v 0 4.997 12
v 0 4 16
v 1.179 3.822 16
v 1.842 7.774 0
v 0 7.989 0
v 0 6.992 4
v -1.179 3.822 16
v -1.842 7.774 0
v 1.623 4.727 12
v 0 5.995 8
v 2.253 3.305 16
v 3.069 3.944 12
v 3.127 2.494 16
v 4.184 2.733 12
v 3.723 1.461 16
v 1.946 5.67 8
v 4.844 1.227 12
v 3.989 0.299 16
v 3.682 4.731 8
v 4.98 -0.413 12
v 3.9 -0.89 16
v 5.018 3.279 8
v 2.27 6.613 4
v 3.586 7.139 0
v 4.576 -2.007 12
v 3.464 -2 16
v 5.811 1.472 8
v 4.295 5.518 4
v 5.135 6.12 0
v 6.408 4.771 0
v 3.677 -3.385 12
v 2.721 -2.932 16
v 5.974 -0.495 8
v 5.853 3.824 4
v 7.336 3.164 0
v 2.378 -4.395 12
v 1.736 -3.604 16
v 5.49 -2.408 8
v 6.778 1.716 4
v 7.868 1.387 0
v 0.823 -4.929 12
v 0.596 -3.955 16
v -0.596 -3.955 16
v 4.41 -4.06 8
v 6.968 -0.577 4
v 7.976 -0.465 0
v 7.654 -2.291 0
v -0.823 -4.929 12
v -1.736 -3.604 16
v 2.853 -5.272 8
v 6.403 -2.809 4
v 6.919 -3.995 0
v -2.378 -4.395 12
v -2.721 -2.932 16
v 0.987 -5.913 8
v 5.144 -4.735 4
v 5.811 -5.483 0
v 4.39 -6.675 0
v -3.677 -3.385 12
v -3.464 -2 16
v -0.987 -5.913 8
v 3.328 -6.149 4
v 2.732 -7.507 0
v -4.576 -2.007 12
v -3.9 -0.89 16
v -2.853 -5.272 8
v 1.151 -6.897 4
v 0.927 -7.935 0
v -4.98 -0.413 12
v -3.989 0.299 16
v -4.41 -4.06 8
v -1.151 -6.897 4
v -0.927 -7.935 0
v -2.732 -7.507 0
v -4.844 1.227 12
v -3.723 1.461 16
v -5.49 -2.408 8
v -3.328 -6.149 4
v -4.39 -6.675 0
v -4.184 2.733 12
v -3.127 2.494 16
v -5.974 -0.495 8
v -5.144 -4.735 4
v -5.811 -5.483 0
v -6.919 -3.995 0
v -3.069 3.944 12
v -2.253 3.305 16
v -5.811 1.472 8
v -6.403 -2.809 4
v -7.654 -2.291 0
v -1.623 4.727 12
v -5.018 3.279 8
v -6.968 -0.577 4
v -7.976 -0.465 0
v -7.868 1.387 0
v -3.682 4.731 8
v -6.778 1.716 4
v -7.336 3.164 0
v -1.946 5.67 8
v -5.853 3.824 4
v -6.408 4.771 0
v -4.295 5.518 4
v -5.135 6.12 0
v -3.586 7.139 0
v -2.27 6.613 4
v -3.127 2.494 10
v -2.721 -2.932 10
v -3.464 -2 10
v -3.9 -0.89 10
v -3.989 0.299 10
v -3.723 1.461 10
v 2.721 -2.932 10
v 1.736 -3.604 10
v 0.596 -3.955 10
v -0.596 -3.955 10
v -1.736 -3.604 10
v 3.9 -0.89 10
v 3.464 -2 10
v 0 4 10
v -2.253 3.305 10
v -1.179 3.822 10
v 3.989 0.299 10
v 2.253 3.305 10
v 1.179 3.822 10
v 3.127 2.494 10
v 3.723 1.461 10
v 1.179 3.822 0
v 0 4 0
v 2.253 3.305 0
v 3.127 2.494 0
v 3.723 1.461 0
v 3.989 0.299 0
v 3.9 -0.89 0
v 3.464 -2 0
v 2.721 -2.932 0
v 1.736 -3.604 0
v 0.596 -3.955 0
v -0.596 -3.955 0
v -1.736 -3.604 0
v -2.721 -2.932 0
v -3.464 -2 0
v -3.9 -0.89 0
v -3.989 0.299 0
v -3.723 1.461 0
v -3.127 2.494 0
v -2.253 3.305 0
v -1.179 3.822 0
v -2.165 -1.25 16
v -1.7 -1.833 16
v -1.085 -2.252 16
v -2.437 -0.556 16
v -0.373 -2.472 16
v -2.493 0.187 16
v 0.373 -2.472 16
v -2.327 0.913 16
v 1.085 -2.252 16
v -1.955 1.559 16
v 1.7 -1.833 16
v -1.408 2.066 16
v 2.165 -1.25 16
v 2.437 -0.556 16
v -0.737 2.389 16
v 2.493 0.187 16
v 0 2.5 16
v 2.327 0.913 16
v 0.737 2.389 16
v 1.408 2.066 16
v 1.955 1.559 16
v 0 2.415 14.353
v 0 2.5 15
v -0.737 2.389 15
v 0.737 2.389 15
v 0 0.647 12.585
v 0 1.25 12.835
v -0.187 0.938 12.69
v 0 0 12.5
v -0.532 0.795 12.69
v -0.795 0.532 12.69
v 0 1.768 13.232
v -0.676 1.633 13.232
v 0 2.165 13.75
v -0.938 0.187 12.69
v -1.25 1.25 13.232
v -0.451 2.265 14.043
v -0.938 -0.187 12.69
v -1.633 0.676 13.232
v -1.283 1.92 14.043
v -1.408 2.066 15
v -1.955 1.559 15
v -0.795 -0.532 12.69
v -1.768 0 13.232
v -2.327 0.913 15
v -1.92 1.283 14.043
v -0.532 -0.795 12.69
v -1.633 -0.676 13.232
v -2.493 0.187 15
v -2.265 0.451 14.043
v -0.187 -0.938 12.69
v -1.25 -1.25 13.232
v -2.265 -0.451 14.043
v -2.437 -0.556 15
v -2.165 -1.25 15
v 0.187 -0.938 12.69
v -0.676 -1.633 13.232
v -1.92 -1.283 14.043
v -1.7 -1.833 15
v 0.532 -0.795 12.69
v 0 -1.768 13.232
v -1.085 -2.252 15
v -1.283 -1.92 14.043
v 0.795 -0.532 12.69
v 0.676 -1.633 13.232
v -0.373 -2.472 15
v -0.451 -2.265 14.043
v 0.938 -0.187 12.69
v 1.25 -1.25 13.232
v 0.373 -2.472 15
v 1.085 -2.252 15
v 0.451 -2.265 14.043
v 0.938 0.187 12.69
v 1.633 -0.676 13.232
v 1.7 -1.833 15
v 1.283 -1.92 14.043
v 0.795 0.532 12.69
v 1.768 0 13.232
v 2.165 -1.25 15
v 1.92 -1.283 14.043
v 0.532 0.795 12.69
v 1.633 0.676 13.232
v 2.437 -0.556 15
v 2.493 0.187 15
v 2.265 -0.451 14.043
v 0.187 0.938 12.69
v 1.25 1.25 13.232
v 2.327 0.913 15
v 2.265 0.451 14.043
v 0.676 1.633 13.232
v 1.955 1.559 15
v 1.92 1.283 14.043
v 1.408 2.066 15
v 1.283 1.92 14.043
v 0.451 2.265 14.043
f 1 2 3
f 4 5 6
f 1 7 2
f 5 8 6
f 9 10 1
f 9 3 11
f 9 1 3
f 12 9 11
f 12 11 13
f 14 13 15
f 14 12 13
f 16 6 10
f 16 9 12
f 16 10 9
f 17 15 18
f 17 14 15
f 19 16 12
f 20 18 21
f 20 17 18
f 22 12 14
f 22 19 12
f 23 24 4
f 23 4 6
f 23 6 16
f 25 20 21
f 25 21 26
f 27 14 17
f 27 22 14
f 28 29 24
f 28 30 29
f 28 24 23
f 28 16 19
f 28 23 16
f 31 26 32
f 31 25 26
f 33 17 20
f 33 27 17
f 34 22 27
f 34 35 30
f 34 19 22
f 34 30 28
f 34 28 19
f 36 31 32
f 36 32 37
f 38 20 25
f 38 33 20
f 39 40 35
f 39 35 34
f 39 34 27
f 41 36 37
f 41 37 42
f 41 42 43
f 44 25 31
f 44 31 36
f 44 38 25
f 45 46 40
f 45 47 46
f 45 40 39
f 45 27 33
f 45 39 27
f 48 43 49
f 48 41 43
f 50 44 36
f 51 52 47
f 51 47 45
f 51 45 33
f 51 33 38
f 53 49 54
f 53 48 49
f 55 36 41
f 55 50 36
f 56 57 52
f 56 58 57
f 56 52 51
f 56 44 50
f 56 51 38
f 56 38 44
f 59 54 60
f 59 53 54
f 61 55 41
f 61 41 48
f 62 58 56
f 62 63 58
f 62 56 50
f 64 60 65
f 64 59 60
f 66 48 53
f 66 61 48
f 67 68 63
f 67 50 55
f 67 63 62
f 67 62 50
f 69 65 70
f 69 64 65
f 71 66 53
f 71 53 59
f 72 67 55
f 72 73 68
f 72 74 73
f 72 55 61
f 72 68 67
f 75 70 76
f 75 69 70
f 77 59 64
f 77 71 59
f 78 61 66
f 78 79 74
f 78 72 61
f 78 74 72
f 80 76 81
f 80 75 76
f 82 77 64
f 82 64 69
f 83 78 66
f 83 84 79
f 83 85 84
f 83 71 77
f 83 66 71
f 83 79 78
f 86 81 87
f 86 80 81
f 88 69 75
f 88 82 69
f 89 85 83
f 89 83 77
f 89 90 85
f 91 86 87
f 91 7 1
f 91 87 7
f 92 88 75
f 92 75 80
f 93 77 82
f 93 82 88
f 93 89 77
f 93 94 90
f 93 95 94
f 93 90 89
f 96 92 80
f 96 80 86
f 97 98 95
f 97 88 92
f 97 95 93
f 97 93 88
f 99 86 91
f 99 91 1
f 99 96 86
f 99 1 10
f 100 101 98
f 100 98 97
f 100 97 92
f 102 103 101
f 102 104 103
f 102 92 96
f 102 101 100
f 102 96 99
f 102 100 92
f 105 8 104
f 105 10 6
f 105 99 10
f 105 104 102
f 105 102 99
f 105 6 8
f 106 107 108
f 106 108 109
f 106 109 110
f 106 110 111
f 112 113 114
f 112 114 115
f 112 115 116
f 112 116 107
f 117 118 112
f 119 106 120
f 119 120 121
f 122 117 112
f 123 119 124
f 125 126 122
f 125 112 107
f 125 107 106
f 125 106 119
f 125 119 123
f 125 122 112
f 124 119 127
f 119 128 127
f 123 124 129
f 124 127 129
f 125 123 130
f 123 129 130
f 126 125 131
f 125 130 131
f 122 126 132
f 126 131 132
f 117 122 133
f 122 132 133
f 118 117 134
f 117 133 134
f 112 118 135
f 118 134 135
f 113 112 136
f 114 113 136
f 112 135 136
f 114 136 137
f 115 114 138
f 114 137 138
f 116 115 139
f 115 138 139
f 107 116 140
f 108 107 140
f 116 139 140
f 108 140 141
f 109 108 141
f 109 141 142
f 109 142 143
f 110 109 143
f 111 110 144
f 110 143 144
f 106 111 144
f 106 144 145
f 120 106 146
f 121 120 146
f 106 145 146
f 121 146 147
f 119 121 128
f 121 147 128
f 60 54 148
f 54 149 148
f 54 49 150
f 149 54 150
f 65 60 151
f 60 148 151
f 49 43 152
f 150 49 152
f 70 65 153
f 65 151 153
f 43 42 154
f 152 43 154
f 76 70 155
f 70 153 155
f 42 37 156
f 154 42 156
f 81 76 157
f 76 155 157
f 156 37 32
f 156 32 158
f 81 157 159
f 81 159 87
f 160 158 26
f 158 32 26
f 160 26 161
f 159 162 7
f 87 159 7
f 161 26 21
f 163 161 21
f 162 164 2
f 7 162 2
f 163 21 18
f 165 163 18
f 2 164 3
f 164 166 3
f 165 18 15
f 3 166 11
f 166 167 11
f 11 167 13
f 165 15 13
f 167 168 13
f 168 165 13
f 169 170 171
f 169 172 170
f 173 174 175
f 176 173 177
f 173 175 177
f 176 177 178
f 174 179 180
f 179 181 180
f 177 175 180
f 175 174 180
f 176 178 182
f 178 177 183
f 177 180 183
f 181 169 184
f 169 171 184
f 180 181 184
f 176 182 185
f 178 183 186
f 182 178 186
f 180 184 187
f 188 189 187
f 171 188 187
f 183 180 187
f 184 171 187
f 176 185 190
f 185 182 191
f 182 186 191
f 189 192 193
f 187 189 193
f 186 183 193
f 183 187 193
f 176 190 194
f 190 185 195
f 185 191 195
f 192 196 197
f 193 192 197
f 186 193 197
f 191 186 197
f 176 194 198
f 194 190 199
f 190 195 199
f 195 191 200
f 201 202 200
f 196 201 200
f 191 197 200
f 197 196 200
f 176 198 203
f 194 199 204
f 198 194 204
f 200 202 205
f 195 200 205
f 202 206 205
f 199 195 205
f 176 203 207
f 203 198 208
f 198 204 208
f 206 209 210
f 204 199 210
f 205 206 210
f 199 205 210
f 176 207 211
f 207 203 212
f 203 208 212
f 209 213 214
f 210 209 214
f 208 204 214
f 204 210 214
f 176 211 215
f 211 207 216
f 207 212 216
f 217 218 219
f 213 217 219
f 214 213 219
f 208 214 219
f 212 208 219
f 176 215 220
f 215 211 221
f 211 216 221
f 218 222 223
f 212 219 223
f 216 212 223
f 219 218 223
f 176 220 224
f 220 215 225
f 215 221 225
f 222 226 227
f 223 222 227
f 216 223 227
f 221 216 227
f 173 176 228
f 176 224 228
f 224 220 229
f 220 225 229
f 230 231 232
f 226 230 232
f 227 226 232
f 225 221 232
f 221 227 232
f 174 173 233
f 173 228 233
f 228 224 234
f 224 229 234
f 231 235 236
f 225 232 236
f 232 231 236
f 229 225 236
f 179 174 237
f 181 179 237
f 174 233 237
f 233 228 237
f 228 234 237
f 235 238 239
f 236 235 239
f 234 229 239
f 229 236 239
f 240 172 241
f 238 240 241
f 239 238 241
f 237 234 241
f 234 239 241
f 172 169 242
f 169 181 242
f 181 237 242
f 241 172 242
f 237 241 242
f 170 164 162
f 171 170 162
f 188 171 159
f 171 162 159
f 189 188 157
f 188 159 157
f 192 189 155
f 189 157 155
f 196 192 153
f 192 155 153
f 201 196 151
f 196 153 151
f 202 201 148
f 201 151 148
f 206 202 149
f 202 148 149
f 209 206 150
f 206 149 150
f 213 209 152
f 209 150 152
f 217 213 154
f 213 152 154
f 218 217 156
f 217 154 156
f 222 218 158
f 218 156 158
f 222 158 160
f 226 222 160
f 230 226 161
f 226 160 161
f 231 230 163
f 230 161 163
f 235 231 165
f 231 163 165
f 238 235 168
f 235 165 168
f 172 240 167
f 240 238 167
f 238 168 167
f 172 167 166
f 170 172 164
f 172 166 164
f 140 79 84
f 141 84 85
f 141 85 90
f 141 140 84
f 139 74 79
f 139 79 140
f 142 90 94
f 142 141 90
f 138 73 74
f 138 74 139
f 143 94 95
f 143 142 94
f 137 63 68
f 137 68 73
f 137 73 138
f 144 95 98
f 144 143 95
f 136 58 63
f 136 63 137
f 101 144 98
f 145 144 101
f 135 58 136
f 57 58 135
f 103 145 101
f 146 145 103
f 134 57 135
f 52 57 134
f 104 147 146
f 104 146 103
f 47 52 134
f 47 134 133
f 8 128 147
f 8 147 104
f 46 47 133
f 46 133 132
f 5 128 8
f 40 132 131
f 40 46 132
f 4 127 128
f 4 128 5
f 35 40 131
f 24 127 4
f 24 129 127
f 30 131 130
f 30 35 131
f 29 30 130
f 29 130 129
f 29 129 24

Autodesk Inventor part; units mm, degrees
ref_plane "YZ Plane" through (0, 0, 0) normal (1, 0, 0) x (0, 1, 0)
ref_plane "XZ Plane" through (0, 0, 0) normal (0, 1, 0) x (-1, 0, 0)
ref_plane "XY Plane" through (0, 0, 0) normal (0, 0, 1) x (1, 0, 0)
sketch "Sketch1" plane through (0, 0, 0) normal (1, 0, 0) x (0, 1, 0)
  line L0 (0, 16) -> (4, 16) construction
  arc A0 (7.9892, 0) -> (4, 16) centre (-30.9916, -1.2217) ccw construction
  arc A1 (0, 12.5) -> (2.5, 15) centre (0, 15) ccw
  line L1 (0, 12.5) -> (0, 0) construction
  line L2 (4, 16) -> (2.5, 16)
  line L3 (2.5, 15) -> (2.5, 16)
  line L4 (7.9892, 0) -> (4, 0)
  line L5 (4, 10) -> (0, 10)
  line L6 (4, 10) -> (4, 0)
  line L7 (0, 12.5) -> (0, 10)
  line L8 (7.9892, 0) -> (4, 16)
  dimension "d0" = 4
  dimension "d3" = 5
  dimension "d4" = 1
  dimension "d5" = 4
  dimension "d11" = 10
  dimension "d12" = 16
  dimension "d13" = 104
revolve "Revolution1" add sketch "Sketch1" angle 360 about axis through (0, 0, 12.5) along (0, 0, -1)
sketch "Sketch2" plane through (0, 0, 0) normal (1, 0, 0) x (0, 1, 0)
  arc A0 (-2.5, 15) -> (2.5, 15) centre (0, 15) ccw projected
  circle A1 centre (0, 15) radius 1.5
  line L0 (0.6744, 16.3398) -> (-0.6744, 13.6602)
  point P0 (0, 0)
  dimension "d8" = 3
revolve "Revolution2" [suppressed]
properties part number "brush fitting"
